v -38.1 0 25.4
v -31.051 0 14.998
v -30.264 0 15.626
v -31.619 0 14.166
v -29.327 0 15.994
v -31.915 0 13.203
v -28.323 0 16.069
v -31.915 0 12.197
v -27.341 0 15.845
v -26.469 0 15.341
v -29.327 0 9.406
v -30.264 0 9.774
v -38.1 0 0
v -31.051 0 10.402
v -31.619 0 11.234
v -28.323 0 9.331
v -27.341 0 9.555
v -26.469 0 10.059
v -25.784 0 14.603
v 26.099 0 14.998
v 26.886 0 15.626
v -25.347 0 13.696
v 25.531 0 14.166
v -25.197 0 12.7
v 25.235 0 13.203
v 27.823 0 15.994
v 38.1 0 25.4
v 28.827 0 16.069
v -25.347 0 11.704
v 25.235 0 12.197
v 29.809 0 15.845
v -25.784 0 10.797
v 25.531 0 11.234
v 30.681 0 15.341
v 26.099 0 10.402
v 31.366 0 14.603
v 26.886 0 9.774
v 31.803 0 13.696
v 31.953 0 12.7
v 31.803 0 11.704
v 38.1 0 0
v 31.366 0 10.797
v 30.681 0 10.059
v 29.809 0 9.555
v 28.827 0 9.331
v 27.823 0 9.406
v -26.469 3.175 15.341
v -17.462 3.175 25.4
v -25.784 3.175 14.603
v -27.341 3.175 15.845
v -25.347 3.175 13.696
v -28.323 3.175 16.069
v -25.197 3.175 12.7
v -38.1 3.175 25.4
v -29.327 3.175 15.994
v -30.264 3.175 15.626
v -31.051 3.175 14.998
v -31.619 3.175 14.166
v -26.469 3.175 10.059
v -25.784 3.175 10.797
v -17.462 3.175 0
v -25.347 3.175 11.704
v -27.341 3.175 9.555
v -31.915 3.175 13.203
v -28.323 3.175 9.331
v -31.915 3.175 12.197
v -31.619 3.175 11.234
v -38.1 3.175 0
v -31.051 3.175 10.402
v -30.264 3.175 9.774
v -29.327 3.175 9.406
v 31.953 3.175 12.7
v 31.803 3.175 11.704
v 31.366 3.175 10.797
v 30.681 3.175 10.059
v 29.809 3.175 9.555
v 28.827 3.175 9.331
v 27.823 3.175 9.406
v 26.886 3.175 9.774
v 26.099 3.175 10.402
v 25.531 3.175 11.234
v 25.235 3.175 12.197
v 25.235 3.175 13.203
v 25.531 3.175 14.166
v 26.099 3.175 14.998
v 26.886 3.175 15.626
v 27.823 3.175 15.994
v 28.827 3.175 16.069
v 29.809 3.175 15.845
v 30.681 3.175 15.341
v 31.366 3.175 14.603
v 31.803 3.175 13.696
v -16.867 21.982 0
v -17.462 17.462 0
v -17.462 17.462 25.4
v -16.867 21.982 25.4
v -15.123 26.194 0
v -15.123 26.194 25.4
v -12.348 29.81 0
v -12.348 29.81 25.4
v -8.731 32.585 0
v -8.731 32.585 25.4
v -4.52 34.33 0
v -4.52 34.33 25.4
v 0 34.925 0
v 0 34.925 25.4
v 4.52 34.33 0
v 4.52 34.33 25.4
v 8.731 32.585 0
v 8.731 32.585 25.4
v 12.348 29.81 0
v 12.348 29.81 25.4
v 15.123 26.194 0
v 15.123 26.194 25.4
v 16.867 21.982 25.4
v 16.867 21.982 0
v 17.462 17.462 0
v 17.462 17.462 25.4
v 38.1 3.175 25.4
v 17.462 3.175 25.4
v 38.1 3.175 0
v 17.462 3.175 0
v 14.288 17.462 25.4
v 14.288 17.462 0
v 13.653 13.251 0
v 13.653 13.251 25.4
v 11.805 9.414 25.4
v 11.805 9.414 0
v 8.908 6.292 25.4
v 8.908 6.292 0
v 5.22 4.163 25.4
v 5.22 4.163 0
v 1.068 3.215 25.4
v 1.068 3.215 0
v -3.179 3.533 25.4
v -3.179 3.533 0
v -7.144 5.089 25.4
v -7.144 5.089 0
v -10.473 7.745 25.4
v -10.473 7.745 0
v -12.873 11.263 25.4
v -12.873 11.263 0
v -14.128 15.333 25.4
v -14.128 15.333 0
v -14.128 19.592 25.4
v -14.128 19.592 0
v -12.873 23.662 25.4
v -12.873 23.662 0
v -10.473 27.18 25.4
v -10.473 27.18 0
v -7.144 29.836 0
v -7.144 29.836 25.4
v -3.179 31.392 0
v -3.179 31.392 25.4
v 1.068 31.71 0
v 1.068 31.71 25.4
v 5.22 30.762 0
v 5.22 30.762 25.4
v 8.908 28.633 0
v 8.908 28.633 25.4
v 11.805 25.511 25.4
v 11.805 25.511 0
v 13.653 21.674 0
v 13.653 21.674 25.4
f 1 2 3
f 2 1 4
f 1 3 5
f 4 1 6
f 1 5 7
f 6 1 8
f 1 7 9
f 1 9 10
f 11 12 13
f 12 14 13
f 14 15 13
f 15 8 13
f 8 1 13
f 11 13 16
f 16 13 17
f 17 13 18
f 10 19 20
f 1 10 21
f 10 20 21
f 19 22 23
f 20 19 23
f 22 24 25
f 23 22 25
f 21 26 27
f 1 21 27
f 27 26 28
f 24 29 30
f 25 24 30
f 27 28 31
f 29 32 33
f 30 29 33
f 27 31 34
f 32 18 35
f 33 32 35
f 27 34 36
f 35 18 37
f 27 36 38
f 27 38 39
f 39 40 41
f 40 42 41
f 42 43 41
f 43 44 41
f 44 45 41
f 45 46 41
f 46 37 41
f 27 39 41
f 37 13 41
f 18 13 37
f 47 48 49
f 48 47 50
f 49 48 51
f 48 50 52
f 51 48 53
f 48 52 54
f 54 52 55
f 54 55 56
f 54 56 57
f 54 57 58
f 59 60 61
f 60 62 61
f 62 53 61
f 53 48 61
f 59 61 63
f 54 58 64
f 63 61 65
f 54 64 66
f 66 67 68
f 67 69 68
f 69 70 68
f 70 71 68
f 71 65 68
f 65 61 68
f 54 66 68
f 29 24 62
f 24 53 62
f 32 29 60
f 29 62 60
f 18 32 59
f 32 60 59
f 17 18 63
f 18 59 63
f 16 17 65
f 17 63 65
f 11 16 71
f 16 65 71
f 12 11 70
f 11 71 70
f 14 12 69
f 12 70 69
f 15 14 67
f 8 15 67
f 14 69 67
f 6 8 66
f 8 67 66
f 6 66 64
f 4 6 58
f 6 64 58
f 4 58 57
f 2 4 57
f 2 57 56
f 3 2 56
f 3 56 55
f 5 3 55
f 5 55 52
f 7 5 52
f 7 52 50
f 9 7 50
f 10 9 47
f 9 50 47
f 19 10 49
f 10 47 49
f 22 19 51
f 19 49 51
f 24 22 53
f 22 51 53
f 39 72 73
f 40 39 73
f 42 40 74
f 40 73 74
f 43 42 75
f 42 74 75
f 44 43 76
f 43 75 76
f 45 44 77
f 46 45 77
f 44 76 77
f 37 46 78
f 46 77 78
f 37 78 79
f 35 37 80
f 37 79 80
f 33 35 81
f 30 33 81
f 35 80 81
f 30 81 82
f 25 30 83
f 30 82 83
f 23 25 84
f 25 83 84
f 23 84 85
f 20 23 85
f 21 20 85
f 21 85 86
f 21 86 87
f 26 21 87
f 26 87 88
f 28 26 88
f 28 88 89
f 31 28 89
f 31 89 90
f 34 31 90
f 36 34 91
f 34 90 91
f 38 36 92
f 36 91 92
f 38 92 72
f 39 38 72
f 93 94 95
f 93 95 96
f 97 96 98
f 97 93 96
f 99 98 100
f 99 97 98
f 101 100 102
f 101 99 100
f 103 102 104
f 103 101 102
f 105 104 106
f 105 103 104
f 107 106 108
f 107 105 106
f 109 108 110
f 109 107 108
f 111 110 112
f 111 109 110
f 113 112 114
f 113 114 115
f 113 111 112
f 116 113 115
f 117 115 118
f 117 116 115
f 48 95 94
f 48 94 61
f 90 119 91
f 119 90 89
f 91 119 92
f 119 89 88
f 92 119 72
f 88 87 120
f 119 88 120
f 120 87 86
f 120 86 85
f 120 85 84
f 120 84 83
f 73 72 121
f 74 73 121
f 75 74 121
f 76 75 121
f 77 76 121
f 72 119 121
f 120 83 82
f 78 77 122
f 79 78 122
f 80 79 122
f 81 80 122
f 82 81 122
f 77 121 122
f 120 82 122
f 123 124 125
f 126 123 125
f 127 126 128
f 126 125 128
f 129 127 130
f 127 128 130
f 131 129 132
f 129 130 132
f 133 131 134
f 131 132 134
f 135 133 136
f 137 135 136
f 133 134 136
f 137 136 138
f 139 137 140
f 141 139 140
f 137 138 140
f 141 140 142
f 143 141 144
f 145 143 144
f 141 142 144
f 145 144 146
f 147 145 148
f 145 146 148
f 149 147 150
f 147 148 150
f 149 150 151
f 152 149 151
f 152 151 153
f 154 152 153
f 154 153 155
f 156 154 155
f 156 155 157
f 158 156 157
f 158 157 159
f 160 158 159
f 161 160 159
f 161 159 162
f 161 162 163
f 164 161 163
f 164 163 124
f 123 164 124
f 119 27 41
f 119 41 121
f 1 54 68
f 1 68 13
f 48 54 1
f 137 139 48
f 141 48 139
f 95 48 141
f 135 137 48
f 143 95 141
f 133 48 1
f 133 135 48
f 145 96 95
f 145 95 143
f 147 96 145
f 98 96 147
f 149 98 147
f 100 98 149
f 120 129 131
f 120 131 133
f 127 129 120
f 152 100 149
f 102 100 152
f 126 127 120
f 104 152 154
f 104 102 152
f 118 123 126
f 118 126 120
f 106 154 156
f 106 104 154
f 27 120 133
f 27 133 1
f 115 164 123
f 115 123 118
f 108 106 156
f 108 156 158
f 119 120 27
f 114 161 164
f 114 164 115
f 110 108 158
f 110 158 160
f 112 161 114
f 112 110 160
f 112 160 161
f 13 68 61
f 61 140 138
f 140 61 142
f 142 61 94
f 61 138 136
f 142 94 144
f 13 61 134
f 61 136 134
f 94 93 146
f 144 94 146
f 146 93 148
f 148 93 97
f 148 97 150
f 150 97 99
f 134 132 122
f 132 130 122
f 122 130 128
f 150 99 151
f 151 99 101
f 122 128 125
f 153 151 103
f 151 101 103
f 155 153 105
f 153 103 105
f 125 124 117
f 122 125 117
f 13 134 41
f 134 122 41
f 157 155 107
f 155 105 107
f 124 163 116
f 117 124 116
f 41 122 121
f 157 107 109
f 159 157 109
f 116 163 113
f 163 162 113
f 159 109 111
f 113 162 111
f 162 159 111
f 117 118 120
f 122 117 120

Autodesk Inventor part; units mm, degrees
ref_plane "YZ Plane" through (0, 0, 0) normal (1, 0, 0) x (0, 1, 0)
ref_plane "XZ Plane" through (0, 0, 0) normal (0, 1, 0) x (-1, 0, 0)
ref_plane "XY Plane" through (0, 0, 0) normal (0, 0, 1) x (1, 0, 0)
sketch "Sketch1" plane through (0, 0, 0) normal (0, 0, 1) x (1, 0, 0)
  line L0 (0, 0) -> (-38.1, 0)
  line L1 (0, 0) -> (38.1, 0)
  line L2 (38.1, 0) -> (38.1, 3.175)
  line L3 (38.1, 3.175) -> (-38.1, 3.175)
  line L4 (-38.1, 3.175) -> (-38.1, 0)
  line L5 (0, 0) -> (0, 17.4625)
  circle A0 centre (0, 17.4625) radius 14.2875
  arc A1 (0, 0) -> (0, 0) centre (0, 17.4625) ccw
  circle A2 centre (0, 17.4625) radius 17.4625
  line L6 (-17.4625, 17.4625) -> (-17.4625, 3.175)
  line L7 (17.4625, 17.4625) -> (17.4625, 3.175)
  dimension "d0" = 38.1
  dimension "d1" = 38.1
  dimension "d2" = 3.175
  dimension "d3" = 17.4625
  dimension "d4" = 28.575
  dimension "d16" = 3.175
extrude "Extrusion1" add sketch "Sketch1" along normal blind 25.4 contours A1 L3 L2 L1 | A1 L3 L5 | L0 L4 L3 A1 | L5 L3 A1 | L3 A1
sketch "Sketch2" plane through (19.05, 3.175, 0) normal (0, 1, 0) x (1, 0, 0)
  line L0 (19.05, 0) -> (19.05, -25.4) projected
  line L1 (19.05, -12.7) -> (9.525, -12.7)
  circle A0 centre (9.525, -12.7) radius 3.3782
  line L2 (-57.15, 0) -> (-57.15, -25.4) projected
  line L3 (-38.1, 0) -> (-38.1, -25.4) projected
  line L4 (-57.15, -12.7) -> (-47.625, -12.7)
  circle A1 centre (-47.625, -12.7) radius 3.3782
  point P0 (-19.05, 0)
  dimension "d8" = 6.7564
  dimension "d13" = 9.525
  dimension "d14" = 6.7564
  dimension "d15" = 9.525
extrude "Extrusion2" cut sketch "Sketch2" against normal blind 25.4
sketch "Sketch3" plane through (0, 0, 25.4) normal (0, 0, 1) x (1, 0, 0)
  line L0 (38.1, 3.175) -> (10.0402, 3.175) projected
  arc A0 (10.0402, 3.175) -> (-10.0402, 3.175) centre (0, 17.4625) ccw projected
  line L1 (-10.0402, 3.175) -> (-38.1, 3.175) projected
  line L2 (-17.4625, 17.4625) -> (-17.4625, 3.175)
  line L3 (17.4625, 17.4625) -> (17.4625, 3.175)
  point P0 (0, 0)
extrude "Extrusion3" add sketch "Sketch3" against normal blind 25.4
properties part number "p80 bearing mount" material "Aluminum 6061"
